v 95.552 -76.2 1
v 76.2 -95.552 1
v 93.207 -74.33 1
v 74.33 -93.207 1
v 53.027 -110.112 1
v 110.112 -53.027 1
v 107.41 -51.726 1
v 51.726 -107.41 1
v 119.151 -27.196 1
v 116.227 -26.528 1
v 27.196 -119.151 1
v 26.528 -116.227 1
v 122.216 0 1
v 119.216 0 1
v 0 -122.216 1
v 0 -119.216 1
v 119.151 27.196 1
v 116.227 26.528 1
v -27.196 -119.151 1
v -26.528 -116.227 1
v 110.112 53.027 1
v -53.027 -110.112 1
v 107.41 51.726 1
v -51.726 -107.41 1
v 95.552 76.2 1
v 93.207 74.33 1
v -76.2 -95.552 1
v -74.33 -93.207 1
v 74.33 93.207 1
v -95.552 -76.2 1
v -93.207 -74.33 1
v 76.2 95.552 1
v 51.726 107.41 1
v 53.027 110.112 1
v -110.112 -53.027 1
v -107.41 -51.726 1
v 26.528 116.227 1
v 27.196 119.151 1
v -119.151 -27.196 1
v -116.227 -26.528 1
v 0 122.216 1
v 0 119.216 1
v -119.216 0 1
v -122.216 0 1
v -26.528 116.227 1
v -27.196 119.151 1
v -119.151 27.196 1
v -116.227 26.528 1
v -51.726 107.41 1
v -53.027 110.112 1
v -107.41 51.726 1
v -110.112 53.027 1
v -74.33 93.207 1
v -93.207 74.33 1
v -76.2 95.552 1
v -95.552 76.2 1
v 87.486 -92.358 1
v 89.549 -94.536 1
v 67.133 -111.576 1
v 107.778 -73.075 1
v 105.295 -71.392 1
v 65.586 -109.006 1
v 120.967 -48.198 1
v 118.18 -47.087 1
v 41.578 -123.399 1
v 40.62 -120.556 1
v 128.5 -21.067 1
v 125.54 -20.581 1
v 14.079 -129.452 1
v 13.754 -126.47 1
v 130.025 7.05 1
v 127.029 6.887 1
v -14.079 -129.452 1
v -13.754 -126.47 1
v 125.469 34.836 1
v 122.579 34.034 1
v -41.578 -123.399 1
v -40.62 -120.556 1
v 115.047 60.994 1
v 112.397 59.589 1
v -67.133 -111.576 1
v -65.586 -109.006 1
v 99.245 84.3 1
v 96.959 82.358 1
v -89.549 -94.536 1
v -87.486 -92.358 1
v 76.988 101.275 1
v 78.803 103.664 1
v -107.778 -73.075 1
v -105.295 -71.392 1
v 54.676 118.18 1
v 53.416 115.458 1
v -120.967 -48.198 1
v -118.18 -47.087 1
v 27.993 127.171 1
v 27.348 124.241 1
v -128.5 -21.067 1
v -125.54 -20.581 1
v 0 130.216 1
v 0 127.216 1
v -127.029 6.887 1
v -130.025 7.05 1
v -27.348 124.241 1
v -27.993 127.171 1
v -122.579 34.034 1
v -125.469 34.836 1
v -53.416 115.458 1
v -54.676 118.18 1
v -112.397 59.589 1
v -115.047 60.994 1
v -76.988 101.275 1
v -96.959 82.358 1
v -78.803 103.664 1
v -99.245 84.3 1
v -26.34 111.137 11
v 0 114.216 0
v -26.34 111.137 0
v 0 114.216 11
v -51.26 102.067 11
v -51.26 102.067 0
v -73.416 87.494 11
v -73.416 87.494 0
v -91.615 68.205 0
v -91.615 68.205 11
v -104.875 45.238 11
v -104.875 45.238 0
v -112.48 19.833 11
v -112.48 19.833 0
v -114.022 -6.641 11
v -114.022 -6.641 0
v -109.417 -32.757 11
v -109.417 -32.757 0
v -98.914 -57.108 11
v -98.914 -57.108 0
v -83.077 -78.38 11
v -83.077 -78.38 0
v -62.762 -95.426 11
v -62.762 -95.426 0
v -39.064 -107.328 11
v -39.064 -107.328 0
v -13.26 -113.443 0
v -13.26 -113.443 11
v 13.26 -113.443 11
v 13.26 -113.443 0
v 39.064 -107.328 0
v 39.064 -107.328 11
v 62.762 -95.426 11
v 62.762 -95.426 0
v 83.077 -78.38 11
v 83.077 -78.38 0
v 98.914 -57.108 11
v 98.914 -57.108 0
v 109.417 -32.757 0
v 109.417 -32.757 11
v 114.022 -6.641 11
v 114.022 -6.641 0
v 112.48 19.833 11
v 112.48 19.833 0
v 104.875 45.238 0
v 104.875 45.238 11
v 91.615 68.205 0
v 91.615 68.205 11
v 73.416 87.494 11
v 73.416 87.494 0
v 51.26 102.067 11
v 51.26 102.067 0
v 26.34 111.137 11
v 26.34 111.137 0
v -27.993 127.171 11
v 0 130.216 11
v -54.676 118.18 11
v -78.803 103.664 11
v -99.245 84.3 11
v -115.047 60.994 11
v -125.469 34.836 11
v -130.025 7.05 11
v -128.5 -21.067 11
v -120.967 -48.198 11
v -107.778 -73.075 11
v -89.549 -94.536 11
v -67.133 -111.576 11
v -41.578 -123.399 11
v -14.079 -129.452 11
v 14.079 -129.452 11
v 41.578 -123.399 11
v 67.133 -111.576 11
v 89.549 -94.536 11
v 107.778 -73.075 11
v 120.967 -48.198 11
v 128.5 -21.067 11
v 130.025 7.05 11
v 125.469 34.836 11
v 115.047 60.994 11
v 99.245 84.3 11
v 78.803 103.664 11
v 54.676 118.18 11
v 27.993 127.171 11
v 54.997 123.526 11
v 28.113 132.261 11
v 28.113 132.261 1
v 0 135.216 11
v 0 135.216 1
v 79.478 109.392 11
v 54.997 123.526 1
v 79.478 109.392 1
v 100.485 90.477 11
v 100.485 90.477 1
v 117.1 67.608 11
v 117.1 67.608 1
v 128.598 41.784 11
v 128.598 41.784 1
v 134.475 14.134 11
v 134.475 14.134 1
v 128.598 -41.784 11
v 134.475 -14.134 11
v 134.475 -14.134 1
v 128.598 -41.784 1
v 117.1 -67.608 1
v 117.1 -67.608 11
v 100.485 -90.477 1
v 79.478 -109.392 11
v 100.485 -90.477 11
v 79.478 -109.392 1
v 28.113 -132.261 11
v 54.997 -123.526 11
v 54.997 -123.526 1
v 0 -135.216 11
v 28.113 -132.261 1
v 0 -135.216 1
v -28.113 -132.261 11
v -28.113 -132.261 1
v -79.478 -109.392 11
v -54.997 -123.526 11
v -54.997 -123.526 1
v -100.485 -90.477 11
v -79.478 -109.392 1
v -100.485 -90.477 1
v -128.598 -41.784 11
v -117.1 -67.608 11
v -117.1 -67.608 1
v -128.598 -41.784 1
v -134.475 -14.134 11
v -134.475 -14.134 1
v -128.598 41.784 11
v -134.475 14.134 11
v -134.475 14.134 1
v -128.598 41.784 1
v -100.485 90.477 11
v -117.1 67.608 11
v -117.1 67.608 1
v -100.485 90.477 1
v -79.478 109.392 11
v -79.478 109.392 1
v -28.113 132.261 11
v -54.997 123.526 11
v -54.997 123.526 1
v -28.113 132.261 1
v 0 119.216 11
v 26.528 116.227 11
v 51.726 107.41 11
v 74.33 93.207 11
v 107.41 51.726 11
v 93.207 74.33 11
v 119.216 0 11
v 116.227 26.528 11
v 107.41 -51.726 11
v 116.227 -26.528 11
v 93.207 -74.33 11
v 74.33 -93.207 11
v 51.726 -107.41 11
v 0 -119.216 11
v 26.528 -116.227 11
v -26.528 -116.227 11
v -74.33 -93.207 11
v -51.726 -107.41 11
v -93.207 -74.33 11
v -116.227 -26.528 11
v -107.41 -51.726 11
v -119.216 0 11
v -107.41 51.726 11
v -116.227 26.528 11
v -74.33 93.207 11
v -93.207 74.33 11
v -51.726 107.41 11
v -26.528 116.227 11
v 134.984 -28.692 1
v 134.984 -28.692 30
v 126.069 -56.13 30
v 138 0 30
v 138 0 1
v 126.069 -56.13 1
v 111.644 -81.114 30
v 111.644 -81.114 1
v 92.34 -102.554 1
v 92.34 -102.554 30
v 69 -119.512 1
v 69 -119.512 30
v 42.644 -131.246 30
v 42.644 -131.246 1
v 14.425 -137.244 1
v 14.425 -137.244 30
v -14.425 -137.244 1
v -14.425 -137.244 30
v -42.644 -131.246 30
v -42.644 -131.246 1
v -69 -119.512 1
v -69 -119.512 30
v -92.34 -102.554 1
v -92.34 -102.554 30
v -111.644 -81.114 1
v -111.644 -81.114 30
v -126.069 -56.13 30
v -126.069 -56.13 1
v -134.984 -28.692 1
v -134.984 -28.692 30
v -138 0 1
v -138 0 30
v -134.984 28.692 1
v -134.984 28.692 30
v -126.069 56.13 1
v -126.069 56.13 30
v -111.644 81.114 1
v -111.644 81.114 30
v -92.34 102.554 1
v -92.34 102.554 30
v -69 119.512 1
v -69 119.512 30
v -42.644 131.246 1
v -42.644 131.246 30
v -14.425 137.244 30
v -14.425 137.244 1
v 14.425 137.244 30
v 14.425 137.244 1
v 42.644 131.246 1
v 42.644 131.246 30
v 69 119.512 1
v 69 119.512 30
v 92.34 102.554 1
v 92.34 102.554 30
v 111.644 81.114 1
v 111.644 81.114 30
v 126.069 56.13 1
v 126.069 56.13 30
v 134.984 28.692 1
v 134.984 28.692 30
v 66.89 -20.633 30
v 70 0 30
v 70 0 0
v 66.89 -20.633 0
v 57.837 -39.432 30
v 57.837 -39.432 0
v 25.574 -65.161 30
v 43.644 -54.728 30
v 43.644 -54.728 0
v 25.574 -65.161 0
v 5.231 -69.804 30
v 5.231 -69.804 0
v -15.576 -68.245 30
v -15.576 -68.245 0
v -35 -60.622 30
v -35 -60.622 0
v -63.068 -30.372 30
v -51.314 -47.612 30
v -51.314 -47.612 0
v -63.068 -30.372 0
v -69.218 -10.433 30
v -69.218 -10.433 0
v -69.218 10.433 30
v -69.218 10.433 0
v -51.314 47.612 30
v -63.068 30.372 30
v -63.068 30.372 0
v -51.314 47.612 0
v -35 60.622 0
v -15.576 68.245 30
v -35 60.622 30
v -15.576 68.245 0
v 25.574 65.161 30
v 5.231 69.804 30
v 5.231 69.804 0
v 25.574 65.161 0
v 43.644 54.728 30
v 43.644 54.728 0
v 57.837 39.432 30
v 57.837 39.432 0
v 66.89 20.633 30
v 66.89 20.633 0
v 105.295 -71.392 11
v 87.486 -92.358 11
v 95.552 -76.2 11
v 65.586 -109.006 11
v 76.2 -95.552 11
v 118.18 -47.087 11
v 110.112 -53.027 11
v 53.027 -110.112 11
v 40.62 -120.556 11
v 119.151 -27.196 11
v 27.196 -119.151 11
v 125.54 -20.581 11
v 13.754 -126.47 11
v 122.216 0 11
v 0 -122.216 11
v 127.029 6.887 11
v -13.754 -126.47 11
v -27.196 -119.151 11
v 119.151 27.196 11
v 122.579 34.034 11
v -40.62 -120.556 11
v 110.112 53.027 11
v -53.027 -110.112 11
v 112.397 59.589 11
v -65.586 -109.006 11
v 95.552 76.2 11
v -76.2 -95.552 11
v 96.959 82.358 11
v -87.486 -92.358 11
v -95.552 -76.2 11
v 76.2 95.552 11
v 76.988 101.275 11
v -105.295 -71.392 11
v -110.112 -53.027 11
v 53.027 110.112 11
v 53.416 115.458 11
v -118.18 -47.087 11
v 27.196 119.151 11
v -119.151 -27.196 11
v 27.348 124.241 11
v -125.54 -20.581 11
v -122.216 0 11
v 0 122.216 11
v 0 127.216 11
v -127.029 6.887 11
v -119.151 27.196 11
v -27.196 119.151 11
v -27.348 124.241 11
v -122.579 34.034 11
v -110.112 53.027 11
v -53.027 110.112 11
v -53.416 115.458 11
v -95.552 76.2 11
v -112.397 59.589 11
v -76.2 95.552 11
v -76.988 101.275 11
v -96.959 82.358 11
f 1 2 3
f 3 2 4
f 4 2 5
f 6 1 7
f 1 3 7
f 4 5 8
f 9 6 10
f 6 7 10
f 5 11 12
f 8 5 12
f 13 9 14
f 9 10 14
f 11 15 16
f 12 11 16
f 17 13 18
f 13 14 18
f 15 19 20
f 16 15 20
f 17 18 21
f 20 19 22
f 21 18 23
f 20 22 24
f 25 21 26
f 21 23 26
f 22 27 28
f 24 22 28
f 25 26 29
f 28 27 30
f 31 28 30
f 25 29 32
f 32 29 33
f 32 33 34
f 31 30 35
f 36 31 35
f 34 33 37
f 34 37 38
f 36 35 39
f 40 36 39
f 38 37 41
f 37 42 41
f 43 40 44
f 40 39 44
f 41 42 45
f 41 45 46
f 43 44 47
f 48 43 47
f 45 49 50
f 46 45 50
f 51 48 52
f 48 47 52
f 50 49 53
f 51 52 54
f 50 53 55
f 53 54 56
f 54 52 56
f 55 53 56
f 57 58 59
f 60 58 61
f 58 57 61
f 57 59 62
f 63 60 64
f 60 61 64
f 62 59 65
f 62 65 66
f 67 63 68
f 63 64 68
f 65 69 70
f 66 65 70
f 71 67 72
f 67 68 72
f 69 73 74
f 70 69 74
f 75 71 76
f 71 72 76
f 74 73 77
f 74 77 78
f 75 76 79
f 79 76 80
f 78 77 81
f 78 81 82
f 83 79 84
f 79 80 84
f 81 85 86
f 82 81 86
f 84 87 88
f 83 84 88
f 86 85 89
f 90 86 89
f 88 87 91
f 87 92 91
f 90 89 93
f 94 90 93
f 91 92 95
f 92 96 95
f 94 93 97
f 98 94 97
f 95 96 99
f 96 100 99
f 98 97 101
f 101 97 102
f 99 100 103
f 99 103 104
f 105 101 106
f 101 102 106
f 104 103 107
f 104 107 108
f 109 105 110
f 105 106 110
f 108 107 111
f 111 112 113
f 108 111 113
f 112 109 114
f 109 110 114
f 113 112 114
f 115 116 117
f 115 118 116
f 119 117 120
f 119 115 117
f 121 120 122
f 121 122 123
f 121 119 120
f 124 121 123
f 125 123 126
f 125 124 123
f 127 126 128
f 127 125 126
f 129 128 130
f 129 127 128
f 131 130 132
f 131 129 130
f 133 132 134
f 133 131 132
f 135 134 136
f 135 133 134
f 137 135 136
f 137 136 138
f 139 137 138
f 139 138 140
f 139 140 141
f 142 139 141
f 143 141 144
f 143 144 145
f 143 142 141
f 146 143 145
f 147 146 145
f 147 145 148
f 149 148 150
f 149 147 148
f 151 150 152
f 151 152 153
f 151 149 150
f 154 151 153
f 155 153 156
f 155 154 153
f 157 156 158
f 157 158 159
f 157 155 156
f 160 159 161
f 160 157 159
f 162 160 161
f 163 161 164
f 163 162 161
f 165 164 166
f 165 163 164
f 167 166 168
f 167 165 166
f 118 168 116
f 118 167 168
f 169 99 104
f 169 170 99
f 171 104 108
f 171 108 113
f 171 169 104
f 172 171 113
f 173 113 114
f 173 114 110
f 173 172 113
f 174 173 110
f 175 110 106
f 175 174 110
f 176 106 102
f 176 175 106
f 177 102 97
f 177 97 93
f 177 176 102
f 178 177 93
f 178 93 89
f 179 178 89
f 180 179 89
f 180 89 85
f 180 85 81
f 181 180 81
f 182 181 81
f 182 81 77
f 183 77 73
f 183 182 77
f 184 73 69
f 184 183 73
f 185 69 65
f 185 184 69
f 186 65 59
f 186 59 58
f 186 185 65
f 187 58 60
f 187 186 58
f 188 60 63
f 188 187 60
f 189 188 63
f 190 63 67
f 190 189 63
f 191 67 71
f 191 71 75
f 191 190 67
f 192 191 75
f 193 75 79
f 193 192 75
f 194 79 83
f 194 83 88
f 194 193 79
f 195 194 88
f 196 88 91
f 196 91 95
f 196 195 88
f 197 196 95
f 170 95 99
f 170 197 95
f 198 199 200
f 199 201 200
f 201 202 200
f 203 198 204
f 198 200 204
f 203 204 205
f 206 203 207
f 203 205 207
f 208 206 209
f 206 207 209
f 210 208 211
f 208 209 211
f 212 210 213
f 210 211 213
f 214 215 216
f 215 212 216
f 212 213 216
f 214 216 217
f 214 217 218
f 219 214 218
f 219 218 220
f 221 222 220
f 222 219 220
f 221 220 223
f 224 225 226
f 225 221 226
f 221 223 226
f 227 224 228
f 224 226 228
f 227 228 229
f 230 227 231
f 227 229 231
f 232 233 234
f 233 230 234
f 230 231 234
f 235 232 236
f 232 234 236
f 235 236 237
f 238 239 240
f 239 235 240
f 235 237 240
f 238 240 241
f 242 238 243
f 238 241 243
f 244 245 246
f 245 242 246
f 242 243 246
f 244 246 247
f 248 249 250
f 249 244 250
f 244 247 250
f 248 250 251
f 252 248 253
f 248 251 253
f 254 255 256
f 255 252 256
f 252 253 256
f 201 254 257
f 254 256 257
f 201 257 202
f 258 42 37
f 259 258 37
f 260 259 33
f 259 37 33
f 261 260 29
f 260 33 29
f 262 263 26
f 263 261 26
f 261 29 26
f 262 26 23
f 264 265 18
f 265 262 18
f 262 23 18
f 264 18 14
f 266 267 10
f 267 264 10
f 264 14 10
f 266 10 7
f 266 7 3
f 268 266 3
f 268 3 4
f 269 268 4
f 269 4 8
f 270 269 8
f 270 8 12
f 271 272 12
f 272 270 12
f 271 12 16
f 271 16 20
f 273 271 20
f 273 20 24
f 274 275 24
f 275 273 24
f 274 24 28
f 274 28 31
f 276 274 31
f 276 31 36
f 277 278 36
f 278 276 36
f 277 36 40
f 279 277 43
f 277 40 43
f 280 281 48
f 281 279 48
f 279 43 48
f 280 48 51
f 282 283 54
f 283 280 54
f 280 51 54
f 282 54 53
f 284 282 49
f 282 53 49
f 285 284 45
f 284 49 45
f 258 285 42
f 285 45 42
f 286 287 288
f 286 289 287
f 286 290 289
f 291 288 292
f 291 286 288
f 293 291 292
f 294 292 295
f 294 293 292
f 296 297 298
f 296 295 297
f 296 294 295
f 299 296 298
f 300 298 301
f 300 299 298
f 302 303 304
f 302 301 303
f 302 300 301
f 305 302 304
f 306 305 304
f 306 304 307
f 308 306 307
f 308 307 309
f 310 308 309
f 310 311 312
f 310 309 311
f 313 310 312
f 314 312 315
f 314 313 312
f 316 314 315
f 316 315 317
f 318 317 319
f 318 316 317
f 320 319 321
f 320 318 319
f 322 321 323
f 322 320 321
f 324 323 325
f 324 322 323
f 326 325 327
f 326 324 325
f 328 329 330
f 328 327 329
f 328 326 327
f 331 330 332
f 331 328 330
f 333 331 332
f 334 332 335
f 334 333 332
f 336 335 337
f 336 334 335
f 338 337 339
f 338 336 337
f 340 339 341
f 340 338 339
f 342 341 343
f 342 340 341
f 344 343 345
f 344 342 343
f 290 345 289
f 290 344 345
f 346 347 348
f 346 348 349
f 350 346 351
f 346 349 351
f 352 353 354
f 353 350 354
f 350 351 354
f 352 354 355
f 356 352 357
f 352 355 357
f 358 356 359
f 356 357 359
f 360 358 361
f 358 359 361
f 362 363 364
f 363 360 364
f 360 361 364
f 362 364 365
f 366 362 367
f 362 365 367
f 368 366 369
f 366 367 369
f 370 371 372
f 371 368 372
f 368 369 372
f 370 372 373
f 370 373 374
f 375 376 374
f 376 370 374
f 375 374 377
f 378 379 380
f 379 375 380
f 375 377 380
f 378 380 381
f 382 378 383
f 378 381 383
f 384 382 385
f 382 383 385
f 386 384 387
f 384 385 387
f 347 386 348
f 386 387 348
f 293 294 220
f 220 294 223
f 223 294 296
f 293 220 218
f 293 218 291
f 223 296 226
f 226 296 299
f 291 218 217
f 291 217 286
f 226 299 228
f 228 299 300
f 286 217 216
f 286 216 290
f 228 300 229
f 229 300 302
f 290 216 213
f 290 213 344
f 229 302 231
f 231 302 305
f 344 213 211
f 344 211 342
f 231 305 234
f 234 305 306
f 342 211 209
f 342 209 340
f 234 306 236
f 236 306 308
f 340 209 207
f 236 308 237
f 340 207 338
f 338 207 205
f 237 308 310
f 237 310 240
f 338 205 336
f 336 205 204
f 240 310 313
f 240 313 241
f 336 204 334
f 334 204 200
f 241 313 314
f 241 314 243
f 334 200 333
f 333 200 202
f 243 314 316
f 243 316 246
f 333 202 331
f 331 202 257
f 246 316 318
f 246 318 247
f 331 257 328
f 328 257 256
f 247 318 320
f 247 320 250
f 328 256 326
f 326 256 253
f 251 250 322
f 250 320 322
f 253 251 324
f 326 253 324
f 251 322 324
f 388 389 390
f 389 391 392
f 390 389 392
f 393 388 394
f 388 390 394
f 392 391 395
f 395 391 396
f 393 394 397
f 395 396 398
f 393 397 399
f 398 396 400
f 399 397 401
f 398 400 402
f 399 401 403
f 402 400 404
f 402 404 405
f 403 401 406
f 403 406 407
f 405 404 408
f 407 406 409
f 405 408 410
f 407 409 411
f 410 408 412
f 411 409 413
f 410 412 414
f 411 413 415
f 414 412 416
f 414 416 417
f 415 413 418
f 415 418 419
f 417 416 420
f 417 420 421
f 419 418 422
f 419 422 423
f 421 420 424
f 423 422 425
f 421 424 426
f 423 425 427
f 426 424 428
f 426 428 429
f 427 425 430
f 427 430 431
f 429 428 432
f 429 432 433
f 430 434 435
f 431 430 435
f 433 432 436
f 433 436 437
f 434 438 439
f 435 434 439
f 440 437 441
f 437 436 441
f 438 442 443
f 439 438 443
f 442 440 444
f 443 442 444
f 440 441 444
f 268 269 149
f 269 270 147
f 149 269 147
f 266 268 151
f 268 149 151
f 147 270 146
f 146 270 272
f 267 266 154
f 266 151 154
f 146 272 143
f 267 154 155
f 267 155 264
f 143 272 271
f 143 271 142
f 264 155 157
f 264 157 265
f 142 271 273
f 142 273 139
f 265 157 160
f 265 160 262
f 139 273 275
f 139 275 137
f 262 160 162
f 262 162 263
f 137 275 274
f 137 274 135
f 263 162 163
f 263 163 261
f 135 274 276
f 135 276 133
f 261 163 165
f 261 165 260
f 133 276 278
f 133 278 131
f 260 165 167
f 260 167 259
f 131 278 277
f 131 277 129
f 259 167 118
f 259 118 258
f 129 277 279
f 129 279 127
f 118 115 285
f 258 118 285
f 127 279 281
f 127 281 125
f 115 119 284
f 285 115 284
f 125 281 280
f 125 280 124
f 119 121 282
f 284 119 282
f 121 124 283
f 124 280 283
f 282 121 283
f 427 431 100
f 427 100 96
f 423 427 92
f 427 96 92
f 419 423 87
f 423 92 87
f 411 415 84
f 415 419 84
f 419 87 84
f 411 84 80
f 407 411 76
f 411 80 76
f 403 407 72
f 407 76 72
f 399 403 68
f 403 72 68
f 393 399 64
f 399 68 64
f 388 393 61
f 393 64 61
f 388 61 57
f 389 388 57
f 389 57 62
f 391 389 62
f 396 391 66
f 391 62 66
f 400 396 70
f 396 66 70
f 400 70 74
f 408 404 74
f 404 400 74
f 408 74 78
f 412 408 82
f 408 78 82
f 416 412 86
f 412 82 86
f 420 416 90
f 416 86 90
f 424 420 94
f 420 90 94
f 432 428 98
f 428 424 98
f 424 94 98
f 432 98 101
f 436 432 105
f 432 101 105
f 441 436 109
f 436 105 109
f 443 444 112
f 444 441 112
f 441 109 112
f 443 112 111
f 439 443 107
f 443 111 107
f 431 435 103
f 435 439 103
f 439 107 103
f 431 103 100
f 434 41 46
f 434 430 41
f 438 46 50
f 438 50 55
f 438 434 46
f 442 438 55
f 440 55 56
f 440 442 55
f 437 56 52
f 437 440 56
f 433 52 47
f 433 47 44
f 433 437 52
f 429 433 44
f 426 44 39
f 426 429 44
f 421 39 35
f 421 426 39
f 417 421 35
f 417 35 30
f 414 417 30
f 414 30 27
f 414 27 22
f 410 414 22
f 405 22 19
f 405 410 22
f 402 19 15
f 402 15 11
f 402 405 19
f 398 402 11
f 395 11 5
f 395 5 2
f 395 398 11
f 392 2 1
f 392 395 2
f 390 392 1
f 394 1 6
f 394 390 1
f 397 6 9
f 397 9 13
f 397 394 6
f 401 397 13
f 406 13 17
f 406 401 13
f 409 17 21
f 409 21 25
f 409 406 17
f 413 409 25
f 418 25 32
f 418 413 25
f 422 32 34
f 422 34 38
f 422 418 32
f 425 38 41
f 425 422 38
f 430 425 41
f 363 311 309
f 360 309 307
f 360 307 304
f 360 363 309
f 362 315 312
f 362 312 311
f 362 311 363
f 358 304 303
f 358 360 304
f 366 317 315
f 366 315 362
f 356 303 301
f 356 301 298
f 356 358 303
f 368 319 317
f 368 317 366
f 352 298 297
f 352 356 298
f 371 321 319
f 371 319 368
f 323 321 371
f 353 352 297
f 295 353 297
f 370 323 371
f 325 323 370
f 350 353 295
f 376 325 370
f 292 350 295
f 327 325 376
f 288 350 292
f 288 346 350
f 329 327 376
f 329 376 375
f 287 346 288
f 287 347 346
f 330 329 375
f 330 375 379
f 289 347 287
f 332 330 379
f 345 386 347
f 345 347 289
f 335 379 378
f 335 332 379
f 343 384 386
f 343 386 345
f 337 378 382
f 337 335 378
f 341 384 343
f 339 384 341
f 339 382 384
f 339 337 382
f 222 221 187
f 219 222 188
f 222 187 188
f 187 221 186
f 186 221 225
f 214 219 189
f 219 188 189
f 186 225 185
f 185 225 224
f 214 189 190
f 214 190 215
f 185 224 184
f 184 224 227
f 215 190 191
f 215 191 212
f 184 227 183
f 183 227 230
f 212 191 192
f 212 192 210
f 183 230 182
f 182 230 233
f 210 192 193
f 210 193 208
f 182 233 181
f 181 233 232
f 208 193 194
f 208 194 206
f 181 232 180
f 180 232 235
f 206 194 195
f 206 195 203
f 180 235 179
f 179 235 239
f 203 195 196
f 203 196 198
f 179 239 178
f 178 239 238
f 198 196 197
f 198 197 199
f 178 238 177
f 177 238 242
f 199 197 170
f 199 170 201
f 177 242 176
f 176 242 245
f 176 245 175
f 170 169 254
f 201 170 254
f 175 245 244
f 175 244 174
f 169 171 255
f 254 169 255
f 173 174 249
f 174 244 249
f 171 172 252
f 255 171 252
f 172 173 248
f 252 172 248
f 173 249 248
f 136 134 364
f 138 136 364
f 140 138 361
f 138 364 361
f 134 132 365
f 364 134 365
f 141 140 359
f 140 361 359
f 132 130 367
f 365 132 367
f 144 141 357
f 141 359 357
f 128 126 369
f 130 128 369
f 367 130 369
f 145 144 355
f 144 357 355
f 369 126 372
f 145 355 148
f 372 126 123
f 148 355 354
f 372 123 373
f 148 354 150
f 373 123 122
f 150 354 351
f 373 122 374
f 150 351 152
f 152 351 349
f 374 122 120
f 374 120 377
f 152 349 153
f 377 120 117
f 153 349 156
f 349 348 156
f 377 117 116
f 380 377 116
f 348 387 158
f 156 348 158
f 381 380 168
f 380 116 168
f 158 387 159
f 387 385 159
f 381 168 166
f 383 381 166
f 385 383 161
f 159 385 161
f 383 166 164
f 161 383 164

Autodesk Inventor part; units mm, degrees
ref_plane "YZ Plane" through (0, 0, 0) normal (1, 0, 0) x (0, 1, 0)
ref_plane "XZ Plane" through (0, 0, 0) normal (0, 1, 0) x (-1, 0, 0)
ref_plane "XY Plane" through (0, 0, 0) normal (0, 0, 1) x (1, 0, 0)
sketch "Sketch2" plane through (0, 0, 0) normal (0, 0, 1) x (1, 0, 0)
  circle A0 centre (0, 0) radius 70
  circle A1 centre (0, 0) radius 138
  dimension "d1" = 140
  dimension "d2" = 276
extrude "Extrusion1" add sketch "Sketch2" along normal blind 30
sketch "Sketch5" plane through (0, 0, 0) normal (1, 0, 0) x (0, 1, 0)
  line L0 (-138, 0) -> (138, 0) projected
  line L1 (72.7156, 0) -> (114.2156, 0)
  line L2 (114.2156, 0) -> (114.2156, 11)
  line L3 (114.2156, 11) -> (119.2156, 11)
  line L4 (119.2156, 11) -> (119.2156, 1)
  line L5 (119.2156, 1) -> (122.2156, 1)
  line L6 (122.2156, 1) -> (122.2156, 11)
  line L7 (122.2156, 11) -> (127.2156, 11)
  line L8 (127.2156, 11) -> (127.2156, 1)
  line L9 (127.2156, 1) -> (130.2156, 1)
  line L10 (130.2156, 1) -> (130.2156, 11)
  line L11 (130.2156, 11) -> (135.2156, 11)
  line L12 (135.2156, 11) -> (135.2156, 1)
  line L13 (135.2156, 1) -> (138, 1)
  line L14 (138, 0) -> (138, 30) projected
  line L15 (0, -6) -> (0, 36) projected
  point P0 (0, 0)
  dimension "d31" = 41.5
  dimension "d32" = 11
  dimension "d33" = 23.7844
  dimension "d34" = 5
  dimension "d35" = 10
  dimension "d36" = 3
  dimension "d37" = 10
  dimension "d38" = 5
  dimension "d39" = 10
  dimension "d40" = 3
  dimension "d41" = 10
  dimension "d42" = 5
  dimension "d43" = 10
revolve "Revolution3" cut sketch "Sketch5" angle 360 about axis through (0, 0, -10) along (0, 0, 1)
properties part number "lavirinthos_exodos"
